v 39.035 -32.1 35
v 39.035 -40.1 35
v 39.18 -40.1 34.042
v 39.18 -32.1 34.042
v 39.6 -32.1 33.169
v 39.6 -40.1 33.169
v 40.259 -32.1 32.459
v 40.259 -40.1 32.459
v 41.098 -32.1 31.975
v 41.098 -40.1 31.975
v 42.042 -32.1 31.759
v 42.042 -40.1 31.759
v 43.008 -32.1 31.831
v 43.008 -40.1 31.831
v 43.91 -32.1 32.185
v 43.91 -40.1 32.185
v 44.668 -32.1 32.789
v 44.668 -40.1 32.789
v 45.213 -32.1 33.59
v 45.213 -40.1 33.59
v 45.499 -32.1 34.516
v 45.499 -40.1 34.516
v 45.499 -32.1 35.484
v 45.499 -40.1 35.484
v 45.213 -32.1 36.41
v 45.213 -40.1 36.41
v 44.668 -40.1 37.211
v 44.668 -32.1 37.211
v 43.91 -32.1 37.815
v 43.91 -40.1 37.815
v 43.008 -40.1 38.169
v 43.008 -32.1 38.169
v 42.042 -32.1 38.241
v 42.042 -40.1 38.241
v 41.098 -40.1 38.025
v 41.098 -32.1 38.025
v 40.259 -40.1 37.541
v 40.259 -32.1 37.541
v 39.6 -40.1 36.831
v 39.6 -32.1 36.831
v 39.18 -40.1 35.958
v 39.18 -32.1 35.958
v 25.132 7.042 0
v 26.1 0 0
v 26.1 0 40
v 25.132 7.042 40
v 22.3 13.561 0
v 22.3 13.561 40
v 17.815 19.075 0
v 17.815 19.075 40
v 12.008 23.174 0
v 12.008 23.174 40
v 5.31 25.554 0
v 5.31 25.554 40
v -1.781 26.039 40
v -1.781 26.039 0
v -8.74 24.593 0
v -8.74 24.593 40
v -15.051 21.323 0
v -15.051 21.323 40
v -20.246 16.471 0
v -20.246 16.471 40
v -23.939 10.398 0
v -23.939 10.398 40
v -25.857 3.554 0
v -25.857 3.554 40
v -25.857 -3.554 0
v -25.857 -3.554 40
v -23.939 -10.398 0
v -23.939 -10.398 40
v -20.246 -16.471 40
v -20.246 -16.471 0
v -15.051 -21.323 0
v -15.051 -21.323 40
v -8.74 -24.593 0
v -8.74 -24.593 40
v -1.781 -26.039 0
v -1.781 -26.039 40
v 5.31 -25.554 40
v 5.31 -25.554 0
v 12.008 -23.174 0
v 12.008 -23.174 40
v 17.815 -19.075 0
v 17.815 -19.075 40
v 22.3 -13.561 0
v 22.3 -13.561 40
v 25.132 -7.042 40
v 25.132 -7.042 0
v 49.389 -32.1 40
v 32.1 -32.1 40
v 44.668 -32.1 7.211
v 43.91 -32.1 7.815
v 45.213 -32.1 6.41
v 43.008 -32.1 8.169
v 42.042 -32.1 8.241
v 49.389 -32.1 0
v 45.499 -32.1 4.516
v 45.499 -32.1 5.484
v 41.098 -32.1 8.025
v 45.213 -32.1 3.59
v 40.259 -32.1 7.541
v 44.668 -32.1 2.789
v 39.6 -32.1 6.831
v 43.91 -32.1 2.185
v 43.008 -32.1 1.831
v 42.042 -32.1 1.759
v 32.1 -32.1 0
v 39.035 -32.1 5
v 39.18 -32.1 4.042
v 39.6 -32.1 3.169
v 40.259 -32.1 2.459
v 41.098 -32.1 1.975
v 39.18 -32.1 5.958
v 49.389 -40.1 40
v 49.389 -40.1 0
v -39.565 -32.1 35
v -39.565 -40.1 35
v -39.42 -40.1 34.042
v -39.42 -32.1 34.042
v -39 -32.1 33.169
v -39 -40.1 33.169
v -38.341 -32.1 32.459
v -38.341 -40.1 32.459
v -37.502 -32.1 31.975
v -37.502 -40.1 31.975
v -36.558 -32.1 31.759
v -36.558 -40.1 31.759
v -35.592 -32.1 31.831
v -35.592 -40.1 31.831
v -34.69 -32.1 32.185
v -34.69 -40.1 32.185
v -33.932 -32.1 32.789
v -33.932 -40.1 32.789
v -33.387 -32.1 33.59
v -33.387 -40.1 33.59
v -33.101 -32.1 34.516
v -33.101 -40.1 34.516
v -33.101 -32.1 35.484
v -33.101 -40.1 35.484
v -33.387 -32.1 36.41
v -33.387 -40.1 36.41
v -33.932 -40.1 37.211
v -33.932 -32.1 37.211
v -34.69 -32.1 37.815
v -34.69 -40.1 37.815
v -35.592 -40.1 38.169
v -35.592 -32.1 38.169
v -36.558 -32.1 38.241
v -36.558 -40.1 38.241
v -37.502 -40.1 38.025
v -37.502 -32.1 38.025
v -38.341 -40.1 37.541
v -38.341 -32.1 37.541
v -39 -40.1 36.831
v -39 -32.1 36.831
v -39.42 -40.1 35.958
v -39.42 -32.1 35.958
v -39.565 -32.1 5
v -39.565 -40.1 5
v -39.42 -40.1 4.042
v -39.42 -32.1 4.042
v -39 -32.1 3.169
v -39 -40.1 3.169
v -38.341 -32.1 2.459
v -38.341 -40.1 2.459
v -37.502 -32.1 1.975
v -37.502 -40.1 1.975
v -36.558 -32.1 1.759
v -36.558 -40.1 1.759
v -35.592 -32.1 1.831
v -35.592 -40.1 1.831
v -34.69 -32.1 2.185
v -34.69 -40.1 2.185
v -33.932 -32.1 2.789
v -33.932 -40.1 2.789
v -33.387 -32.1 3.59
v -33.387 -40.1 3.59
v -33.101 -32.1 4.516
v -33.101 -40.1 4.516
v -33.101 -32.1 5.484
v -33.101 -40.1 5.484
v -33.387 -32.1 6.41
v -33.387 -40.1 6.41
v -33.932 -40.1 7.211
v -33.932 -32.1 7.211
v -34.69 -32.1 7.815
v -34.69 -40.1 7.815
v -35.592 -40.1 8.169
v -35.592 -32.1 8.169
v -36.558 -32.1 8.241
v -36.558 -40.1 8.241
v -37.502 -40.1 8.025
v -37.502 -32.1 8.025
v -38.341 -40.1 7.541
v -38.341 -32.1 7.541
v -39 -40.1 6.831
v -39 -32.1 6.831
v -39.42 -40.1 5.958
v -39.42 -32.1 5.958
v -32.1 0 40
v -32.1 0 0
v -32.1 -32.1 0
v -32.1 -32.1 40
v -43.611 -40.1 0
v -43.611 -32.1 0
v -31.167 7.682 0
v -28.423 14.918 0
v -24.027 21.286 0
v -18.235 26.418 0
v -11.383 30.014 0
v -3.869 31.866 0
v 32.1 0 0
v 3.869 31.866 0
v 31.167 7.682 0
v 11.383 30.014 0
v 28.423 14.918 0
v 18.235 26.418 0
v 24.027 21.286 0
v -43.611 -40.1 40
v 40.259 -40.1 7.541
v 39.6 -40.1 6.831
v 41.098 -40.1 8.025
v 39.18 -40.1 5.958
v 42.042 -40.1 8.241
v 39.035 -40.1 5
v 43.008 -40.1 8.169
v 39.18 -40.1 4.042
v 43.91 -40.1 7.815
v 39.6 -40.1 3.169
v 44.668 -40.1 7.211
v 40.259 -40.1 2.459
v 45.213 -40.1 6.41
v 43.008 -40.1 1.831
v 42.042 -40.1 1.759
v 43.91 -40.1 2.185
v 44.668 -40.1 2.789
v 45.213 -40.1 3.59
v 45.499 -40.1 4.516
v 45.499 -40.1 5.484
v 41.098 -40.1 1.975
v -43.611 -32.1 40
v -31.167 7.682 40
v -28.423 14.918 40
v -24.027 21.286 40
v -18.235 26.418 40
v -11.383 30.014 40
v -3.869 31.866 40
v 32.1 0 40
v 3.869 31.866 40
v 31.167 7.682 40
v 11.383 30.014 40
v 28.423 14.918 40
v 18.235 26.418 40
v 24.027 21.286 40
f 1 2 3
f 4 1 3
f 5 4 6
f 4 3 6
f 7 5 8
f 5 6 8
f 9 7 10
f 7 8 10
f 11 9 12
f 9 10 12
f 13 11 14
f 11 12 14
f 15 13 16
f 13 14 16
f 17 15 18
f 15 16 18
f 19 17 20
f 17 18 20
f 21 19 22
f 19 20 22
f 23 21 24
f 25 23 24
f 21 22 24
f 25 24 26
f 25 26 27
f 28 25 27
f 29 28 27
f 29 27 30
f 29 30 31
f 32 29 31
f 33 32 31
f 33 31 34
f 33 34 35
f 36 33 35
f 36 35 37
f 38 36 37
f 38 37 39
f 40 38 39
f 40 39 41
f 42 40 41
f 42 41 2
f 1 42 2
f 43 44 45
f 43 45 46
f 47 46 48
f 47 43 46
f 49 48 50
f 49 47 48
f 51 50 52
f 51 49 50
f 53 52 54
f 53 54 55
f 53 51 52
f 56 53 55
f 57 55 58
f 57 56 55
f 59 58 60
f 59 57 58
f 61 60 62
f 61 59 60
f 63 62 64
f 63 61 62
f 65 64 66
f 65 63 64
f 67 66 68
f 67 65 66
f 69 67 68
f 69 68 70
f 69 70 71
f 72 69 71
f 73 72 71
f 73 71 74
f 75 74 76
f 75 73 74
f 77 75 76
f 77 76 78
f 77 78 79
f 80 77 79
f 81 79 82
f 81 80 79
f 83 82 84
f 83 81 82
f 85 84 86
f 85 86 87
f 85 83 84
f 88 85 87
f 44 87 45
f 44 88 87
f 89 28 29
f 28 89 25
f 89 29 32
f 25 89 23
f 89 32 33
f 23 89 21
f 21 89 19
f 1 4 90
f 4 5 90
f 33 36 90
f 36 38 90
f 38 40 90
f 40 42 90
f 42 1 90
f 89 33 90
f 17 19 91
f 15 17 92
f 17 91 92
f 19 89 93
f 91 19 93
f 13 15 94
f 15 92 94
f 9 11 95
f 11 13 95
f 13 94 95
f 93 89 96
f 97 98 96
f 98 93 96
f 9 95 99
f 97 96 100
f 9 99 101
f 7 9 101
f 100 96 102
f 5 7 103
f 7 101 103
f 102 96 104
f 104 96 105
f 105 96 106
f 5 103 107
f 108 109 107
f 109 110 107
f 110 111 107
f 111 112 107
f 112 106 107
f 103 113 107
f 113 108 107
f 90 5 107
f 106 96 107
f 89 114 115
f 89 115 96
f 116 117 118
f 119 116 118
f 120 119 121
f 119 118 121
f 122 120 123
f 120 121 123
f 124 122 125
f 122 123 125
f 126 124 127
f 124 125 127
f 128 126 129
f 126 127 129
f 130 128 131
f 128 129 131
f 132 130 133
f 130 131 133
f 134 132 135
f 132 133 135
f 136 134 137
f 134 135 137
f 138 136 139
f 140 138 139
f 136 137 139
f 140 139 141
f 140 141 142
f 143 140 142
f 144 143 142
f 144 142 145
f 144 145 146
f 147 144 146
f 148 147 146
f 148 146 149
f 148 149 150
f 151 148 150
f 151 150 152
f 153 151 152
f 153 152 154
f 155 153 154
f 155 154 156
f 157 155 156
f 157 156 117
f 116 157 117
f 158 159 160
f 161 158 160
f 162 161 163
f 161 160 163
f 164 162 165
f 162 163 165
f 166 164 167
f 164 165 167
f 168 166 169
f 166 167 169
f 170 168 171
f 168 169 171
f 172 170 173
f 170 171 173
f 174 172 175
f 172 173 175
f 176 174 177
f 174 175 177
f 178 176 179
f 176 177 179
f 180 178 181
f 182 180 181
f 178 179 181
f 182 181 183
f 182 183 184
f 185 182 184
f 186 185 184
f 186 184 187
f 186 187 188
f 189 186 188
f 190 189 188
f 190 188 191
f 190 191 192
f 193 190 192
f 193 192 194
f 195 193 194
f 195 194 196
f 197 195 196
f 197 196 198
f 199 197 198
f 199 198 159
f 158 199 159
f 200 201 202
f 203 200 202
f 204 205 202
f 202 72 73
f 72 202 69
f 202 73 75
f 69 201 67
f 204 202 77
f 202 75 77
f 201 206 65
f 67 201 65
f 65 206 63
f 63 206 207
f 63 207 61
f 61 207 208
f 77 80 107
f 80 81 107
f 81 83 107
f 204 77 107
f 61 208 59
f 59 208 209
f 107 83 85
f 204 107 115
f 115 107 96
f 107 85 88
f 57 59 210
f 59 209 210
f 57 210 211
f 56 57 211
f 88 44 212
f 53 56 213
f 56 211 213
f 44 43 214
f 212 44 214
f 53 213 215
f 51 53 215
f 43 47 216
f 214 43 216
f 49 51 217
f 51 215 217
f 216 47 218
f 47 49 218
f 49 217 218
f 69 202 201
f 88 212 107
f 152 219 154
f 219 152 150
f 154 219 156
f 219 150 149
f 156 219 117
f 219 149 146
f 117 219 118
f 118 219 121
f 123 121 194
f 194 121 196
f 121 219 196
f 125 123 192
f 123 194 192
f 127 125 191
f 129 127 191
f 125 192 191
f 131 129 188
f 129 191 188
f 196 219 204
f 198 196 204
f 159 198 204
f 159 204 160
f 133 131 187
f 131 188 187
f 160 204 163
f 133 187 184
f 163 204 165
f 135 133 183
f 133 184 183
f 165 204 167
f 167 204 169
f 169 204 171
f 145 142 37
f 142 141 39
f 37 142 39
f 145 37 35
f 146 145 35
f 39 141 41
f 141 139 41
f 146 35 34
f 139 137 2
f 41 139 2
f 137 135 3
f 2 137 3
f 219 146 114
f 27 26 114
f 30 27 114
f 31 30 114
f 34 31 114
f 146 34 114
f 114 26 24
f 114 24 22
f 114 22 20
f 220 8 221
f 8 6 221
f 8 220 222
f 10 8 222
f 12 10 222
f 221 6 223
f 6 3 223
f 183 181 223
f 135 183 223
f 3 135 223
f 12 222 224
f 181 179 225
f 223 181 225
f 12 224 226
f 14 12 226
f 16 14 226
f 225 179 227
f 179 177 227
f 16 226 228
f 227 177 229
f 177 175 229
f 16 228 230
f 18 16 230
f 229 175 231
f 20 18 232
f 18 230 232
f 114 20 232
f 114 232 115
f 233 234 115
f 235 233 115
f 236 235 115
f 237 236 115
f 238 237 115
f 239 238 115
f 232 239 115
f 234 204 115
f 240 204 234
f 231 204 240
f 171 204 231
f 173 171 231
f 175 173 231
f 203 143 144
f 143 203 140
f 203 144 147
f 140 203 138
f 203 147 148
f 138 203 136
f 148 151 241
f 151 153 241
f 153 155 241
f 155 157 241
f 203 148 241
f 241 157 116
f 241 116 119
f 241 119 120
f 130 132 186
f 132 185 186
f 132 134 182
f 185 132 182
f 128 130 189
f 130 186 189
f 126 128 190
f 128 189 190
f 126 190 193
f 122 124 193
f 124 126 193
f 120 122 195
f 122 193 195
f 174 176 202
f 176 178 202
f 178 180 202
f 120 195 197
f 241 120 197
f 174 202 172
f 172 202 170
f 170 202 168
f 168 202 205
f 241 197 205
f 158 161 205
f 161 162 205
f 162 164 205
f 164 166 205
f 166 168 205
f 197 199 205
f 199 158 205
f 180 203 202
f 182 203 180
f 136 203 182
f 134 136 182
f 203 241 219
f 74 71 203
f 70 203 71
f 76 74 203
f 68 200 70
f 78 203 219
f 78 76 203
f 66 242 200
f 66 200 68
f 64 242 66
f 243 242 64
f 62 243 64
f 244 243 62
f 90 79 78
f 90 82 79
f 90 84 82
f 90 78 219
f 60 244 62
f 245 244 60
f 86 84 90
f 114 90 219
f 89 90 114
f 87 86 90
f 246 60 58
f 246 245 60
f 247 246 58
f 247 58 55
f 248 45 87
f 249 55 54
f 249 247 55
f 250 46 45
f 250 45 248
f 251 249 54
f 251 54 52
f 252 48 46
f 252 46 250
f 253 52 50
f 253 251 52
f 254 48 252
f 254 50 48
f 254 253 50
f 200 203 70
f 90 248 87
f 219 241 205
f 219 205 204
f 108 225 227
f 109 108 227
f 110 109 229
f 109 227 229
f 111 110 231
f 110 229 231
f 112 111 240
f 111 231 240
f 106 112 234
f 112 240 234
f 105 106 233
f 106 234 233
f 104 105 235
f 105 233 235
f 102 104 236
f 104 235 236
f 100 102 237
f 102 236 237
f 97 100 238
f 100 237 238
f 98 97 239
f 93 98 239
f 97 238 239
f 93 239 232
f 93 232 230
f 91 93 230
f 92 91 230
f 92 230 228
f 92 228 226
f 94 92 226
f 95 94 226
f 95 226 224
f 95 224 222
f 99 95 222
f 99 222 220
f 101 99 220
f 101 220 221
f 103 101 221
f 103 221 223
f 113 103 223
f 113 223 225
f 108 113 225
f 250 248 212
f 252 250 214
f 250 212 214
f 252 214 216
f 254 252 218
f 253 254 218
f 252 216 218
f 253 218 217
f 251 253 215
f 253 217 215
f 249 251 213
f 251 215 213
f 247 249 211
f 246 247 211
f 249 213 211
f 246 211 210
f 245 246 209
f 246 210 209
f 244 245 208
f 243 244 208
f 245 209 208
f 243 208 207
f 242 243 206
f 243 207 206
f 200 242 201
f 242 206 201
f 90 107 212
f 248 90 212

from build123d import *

# Parameters (mm, degrees)
SKETCH_1_R              = 26.1
EXTRUDE_1_DEPTH         = 40
HOLE_WIZARD_6_5_6_5_1_D = 6.5


with BuildPart() as part:
    # 草图1 → 凸台-拉伸1 (new body)
    with BuildSketch(Plane.XY):
        with BuildLine():
            Line((-32.1, 0), (-32.1, -32.1))
            Line((-32.1, -32.1), (-43.611358786, -32.1))
            Line((-43.611358786, -32.1), (-43.611358786, -40.1))
            Line((-43.611358786, -40.1), (49.388641214, -40.1))
            Line((49.388641214, -40.1), (49.388641214, -32.1))
            Line((49.388641214, -32.1), (32.1, -32.1))
            Line((32.1, -32.1), (32.1, 0))
            ThreePointArc((32.1, 0), (0, 32.1), (-32.1, 0))
        make_face()
        Circle(SKETCH_1_R, mode=Mode.SUBTRACT)
    extrude(amount=EXTRUDE_1_DEPTH)

    # Ø6.5 (6.5) 直径孔1 (through all)
    with Locations(Plane(origin=(0, -32.1, 0), x_dir=(1, 0, 0), z_dir=(0, 1, 0))):
        with Locations((42.285158123, -5), (42.285158123, -35), (-36.314841877, -35), (-36.314841877, -5)):
            Hole(HOLE_WIZARD_6_5_6_5_1_D / 2)


solid = part.part
